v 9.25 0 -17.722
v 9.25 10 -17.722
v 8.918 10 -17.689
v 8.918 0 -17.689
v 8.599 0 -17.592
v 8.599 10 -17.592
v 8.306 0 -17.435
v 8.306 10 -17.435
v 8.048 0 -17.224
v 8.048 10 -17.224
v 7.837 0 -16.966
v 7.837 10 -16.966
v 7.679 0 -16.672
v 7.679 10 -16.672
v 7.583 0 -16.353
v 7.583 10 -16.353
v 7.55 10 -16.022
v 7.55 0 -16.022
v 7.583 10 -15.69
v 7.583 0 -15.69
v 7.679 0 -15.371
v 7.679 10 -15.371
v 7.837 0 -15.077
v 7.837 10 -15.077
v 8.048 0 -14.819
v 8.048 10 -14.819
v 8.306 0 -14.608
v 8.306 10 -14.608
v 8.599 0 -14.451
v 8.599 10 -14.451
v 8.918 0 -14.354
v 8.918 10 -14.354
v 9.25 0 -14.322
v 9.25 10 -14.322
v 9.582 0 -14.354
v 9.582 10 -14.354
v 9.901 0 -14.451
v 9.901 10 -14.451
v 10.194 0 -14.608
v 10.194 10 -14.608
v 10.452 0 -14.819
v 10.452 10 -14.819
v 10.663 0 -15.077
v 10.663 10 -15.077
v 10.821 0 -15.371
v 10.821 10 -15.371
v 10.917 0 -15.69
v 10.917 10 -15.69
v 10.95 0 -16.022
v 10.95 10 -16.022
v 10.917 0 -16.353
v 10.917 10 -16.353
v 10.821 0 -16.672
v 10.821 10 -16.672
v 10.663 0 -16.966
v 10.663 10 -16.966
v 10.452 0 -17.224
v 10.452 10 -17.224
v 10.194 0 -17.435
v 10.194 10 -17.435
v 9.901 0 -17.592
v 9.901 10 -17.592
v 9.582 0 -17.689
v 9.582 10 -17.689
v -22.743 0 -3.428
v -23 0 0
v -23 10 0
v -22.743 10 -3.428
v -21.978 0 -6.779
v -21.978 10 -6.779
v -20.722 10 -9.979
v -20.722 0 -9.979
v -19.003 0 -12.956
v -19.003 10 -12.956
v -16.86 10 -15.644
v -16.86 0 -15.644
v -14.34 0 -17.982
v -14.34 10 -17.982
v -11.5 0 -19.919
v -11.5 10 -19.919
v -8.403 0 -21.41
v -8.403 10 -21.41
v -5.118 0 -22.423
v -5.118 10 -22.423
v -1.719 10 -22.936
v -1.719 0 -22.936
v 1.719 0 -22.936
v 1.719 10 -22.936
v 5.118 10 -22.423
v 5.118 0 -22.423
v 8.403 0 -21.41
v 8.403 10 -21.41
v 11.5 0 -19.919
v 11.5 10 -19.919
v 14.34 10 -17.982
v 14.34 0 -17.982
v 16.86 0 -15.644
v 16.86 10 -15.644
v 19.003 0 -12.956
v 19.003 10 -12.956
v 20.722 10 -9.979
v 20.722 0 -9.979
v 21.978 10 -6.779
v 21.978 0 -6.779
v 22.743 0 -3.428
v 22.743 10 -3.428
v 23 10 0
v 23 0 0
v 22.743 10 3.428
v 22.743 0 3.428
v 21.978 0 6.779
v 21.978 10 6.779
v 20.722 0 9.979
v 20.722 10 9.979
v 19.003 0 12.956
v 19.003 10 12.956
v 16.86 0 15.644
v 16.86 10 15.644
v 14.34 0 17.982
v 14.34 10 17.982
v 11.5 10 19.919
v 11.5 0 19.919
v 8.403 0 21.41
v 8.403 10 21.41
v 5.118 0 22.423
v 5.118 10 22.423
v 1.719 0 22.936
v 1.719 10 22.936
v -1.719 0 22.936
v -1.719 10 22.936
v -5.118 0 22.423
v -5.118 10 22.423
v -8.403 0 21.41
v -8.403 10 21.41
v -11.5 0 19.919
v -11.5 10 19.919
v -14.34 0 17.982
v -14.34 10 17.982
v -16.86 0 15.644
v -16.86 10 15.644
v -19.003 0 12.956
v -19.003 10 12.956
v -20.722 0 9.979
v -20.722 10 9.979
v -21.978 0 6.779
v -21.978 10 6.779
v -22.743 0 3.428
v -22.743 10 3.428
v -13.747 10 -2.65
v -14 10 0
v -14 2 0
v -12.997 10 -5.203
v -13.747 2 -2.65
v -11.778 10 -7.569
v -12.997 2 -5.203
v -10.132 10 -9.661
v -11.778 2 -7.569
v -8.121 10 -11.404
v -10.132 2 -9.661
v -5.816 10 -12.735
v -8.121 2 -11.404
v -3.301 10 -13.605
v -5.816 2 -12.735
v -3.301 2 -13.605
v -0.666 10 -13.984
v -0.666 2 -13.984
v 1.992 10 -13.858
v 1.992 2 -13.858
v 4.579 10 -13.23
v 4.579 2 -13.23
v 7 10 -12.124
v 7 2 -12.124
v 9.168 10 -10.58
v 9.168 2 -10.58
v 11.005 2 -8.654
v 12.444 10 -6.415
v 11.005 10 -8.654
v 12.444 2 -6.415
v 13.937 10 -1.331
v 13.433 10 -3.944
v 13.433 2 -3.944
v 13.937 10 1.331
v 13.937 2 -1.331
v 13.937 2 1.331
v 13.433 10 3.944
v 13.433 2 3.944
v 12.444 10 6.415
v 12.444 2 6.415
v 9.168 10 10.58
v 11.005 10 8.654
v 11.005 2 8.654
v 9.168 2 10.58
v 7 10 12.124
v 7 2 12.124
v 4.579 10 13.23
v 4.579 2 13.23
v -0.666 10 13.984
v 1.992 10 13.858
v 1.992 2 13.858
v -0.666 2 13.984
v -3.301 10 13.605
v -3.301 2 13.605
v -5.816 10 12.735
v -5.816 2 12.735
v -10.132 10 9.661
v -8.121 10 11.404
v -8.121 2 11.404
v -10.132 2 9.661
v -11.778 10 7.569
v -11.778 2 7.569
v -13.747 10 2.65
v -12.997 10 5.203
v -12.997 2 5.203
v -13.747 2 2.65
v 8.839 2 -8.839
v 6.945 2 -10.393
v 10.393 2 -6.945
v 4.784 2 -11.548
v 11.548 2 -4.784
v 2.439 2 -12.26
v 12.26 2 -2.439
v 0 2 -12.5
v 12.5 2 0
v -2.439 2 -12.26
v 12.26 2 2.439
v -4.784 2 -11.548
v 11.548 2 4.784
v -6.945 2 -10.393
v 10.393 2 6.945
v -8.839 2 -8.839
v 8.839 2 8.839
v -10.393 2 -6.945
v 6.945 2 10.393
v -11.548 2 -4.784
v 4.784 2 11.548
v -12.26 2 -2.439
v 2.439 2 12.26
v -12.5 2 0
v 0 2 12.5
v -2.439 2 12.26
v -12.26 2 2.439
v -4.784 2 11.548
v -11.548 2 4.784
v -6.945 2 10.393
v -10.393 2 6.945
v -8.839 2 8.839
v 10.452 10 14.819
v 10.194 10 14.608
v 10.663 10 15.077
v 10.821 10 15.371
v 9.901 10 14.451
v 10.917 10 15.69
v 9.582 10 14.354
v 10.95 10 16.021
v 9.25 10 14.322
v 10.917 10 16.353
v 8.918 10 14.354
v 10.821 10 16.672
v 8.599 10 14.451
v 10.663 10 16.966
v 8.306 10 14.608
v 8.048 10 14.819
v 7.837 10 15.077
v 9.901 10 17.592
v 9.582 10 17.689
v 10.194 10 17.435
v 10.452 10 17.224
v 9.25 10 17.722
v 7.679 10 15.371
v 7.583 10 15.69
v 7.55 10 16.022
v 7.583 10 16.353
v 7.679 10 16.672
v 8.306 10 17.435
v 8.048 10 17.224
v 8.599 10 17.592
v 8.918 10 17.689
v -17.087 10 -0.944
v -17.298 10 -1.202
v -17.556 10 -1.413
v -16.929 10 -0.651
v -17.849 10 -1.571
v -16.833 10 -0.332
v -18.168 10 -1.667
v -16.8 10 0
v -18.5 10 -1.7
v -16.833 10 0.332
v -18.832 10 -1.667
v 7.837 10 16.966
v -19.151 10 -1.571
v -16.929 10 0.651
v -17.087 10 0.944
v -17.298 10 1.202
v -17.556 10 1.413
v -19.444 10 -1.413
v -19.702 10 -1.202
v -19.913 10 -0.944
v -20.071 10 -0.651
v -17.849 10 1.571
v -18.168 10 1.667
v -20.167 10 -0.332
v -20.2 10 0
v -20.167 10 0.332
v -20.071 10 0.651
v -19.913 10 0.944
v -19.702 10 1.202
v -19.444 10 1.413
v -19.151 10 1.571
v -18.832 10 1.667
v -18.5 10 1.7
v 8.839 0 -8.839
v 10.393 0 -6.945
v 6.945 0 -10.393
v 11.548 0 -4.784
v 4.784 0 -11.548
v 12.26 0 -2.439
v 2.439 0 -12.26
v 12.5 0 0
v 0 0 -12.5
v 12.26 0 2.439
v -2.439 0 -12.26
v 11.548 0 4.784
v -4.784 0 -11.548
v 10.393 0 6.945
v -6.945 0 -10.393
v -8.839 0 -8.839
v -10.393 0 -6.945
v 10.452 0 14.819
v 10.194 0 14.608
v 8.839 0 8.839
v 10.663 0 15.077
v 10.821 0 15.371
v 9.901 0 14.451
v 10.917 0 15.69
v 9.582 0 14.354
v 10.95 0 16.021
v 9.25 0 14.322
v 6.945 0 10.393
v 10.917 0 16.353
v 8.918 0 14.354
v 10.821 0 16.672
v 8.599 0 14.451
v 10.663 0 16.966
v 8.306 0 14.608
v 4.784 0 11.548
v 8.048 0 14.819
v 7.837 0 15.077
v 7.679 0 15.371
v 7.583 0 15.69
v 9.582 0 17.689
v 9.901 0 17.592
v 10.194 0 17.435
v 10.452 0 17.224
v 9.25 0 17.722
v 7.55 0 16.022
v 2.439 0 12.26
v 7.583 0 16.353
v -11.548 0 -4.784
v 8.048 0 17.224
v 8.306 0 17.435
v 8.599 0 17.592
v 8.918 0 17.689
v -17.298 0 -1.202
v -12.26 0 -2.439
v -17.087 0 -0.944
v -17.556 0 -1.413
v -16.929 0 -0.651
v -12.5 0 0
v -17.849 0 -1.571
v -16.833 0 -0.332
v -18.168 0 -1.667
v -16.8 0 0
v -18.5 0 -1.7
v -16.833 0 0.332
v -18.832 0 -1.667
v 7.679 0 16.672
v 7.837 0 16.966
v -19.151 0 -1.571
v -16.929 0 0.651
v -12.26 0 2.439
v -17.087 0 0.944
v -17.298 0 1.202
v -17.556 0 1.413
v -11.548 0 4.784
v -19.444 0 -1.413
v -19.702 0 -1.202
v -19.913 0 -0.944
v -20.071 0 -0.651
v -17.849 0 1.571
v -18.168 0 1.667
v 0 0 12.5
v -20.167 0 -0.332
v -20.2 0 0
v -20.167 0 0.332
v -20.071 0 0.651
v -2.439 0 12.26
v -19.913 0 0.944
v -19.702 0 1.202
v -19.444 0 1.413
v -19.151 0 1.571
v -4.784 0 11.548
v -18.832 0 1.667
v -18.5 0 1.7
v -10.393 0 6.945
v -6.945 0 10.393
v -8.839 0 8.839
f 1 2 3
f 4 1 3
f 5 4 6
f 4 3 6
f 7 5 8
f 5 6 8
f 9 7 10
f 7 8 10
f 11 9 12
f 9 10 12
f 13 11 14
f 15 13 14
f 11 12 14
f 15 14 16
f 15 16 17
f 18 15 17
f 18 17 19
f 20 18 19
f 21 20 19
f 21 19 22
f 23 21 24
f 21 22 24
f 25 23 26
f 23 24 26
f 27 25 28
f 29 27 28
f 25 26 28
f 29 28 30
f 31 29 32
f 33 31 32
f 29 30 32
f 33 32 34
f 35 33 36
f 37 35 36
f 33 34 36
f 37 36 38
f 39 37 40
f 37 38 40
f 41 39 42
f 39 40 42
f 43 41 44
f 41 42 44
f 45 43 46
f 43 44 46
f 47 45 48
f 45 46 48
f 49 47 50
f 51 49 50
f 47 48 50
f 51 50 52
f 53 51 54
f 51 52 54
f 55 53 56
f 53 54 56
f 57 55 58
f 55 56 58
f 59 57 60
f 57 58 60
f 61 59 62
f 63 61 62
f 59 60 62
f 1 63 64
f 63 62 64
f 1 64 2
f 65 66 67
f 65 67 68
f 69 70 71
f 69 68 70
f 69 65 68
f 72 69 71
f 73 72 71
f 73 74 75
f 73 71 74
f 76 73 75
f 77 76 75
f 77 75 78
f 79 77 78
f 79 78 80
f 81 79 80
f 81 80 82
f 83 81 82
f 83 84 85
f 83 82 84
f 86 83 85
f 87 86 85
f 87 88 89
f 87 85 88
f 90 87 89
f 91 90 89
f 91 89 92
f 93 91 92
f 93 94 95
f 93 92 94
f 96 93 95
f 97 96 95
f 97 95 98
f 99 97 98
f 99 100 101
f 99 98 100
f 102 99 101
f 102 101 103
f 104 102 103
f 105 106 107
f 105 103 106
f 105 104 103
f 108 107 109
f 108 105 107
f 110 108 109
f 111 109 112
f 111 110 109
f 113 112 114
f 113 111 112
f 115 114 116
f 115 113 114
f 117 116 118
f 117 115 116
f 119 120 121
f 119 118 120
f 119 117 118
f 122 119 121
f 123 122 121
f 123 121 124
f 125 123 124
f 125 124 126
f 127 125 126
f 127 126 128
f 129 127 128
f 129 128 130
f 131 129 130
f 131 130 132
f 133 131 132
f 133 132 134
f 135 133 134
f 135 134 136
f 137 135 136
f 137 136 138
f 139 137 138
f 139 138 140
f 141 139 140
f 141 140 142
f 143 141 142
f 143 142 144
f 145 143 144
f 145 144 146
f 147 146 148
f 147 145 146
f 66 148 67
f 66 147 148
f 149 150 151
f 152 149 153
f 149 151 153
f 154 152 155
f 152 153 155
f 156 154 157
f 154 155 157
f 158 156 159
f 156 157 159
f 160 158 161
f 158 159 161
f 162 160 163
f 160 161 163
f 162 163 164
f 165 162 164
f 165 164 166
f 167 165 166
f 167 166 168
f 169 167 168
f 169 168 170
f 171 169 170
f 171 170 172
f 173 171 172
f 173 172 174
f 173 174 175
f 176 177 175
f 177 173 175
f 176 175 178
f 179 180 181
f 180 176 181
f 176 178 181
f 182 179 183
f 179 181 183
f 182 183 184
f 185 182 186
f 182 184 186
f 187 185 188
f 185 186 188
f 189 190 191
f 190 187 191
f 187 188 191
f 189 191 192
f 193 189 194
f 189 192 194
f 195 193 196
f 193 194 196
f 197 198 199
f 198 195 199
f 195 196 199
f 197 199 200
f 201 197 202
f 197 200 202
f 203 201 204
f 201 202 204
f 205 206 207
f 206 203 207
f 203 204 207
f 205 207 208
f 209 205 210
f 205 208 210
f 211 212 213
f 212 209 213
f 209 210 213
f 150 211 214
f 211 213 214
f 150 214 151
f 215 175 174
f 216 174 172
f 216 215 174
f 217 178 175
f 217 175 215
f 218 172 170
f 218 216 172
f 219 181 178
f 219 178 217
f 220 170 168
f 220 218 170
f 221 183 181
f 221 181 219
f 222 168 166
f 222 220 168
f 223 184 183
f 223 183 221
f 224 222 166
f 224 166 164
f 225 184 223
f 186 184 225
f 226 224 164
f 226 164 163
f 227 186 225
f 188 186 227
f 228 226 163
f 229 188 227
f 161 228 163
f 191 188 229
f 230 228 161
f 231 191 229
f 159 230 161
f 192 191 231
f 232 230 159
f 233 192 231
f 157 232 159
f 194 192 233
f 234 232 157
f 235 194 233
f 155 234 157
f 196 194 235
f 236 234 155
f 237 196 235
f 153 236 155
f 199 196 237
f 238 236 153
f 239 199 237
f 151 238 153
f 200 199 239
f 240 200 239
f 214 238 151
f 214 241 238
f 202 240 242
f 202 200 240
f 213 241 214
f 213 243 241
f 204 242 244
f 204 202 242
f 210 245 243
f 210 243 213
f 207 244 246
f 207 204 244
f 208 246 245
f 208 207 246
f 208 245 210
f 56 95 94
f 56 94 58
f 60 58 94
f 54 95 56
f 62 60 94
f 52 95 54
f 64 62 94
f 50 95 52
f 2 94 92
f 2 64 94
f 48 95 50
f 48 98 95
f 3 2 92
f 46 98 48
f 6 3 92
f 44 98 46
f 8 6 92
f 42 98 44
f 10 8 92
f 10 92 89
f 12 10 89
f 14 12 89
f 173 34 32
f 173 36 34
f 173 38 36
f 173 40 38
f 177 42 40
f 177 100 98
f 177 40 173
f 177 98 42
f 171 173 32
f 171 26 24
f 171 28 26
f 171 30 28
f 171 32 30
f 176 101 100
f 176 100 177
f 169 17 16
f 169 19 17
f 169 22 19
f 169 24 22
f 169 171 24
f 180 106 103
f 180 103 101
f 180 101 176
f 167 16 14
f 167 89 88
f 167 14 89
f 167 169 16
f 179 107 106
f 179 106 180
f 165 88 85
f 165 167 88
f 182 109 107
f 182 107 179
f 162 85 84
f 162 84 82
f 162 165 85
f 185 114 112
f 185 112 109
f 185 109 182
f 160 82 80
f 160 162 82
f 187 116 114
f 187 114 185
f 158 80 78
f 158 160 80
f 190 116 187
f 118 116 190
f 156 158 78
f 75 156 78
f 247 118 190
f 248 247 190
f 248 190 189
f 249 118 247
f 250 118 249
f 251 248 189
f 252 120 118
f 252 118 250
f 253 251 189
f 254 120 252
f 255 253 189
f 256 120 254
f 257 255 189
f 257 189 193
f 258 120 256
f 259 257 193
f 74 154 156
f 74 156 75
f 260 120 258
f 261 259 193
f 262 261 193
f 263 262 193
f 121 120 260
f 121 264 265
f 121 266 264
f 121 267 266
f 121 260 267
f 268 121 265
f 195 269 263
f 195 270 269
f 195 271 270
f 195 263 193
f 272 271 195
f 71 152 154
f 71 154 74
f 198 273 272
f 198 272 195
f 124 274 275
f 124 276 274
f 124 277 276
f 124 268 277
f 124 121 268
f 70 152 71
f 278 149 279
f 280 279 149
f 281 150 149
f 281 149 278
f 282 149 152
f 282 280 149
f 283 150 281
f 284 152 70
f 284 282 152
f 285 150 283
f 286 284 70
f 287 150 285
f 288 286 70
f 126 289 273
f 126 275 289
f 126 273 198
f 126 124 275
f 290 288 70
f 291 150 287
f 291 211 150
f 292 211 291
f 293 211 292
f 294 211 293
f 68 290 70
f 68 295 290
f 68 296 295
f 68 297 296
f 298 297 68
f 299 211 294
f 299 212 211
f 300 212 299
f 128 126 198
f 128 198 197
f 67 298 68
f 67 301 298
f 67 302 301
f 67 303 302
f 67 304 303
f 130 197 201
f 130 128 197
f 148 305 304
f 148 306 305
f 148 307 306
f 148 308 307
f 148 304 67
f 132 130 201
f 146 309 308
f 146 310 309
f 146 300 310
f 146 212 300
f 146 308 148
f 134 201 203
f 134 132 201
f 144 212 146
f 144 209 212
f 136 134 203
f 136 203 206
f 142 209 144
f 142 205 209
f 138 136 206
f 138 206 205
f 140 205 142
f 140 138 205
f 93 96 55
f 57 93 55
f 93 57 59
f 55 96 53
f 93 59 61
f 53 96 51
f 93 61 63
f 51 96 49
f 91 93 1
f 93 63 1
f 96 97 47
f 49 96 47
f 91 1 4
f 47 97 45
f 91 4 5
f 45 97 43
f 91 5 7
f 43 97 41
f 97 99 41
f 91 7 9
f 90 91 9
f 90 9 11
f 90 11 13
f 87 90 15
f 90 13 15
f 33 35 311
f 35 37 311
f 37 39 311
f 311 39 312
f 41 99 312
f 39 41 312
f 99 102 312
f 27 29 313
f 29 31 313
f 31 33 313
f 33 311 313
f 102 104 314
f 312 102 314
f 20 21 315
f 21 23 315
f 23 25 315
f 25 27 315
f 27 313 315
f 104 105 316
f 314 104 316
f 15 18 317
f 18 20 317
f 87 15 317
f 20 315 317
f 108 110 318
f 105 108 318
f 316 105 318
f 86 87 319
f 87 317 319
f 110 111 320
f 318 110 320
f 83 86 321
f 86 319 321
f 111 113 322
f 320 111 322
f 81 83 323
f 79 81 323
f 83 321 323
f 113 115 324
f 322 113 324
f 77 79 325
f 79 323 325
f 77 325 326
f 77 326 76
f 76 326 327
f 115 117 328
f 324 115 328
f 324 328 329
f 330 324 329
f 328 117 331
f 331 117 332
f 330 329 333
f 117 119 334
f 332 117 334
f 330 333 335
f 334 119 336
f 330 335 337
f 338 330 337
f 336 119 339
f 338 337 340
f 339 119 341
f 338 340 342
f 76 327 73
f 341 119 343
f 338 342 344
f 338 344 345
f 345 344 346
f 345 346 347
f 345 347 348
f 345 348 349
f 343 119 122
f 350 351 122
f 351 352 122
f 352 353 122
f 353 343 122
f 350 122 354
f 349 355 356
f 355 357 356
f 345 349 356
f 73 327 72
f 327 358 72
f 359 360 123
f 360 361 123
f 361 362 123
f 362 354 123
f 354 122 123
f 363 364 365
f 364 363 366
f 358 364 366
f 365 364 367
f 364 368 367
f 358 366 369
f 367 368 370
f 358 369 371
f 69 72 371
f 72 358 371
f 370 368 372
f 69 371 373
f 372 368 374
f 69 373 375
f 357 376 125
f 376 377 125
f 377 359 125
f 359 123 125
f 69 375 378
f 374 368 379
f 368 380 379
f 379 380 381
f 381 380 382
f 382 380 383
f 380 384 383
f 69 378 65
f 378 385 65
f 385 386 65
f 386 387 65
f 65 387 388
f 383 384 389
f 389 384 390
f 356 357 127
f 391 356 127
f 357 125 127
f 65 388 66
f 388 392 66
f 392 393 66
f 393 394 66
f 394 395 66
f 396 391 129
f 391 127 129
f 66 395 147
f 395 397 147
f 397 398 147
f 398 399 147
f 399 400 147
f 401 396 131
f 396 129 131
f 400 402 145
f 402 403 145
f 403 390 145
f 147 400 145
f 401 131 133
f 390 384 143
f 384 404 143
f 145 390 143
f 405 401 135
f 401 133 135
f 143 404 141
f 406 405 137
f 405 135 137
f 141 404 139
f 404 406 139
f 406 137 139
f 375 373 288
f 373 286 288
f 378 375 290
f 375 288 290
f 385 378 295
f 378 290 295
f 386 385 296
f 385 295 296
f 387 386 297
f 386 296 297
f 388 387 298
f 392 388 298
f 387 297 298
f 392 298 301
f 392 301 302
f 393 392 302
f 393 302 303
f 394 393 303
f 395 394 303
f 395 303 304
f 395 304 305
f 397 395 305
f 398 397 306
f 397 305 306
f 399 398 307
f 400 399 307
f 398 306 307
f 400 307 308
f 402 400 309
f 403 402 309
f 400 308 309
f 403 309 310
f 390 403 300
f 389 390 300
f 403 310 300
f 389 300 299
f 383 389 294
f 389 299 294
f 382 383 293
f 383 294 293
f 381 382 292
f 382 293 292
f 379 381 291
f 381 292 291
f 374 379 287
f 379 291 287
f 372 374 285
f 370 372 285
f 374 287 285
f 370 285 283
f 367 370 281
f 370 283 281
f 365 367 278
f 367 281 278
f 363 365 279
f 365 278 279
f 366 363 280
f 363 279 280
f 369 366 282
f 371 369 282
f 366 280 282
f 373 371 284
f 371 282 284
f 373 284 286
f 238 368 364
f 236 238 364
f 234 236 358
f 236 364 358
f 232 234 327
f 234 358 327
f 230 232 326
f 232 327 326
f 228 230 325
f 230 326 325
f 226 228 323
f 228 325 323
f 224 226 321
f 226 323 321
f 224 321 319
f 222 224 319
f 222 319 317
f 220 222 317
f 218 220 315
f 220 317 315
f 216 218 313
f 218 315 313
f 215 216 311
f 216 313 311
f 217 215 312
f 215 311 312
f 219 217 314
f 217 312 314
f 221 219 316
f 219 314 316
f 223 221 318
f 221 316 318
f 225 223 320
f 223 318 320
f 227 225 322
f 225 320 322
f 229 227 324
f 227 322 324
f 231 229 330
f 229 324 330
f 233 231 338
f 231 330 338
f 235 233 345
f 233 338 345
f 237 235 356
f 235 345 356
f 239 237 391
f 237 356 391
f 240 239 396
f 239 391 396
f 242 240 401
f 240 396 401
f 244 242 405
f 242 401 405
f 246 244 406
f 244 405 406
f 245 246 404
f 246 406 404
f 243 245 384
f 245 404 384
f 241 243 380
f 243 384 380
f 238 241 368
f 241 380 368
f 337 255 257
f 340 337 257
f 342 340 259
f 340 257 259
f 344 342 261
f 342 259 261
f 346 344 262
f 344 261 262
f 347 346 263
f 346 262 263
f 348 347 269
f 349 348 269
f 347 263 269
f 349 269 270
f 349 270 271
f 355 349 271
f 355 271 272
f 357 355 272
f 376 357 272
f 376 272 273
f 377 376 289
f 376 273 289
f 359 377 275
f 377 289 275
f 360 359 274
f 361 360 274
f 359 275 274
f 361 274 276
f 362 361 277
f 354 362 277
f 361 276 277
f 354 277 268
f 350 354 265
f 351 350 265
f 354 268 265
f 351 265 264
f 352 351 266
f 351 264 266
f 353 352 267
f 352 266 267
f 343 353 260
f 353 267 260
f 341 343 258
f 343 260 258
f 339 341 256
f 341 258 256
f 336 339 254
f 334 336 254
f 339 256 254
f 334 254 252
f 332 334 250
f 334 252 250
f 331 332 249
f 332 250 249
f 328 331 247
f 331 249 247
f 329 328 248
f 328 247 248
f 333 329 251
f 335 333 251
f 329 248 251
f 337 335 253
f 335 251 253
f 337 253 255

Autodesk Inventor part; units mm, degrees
ref_plane "YZ Plane" through (0, 0, 0) normal (1, 0, 0) x (0, 1, 0)
ref_plane "XZ Plane" through (0, 0, 0) normal (0, 1, 0) x (-1, 0, 0)
ref_plane "XY Plane" through (0, 0, 0) normal (0, 0, 1) x (1, 0, 0)
sketch "Sketch1" plane through (0, 0, 0) normal (0, 1, 0) x (-1, 0, 0)
  circle A0 centre (0, 0) radius 14
  circle A1 centre (0, 0) radius 23
  line L0 (18.5, 0) -> (-9.25, -16.0215)
  line L1 (-9.25, -16.0215) -> (-9.25, 16.0215)
  line L2 (-9.25, 16.0215) -> (18.5, 0)
  circle A2 centre (0, 0) radius 12.5
  dimension "d0" = 28
  dimension "d1" = 46
  dimension "d2" = 18.5
  dimension "d3" = 25
extrude "Extrusion1" add sketch "Sketch1" along normal blind 10 contours A0 L2 L0 | A0 L1 L2 | L0 L1 A0 | A1
extrude "Extrusion2" add sketch "Sketch1" along normal blind 2 contours A0 L0 A2 L2 | L2 A2 A0 | A0 L0 A2 | L2 A2 L1 A0 | A0 L1 A2 L0 | L1 A2 A0
hole "Hole1" at (-18.5, 0, 0) at (9.25, 0, 16.0215) at (9.25, 0, -16.0215) direction (0, 1, 0) diameter 3.4 end through all clearance for "Countersunk Flat Head Screw ISO 2009/7046" size "M3" standard "ISO"
properties part number "cazoleta"
